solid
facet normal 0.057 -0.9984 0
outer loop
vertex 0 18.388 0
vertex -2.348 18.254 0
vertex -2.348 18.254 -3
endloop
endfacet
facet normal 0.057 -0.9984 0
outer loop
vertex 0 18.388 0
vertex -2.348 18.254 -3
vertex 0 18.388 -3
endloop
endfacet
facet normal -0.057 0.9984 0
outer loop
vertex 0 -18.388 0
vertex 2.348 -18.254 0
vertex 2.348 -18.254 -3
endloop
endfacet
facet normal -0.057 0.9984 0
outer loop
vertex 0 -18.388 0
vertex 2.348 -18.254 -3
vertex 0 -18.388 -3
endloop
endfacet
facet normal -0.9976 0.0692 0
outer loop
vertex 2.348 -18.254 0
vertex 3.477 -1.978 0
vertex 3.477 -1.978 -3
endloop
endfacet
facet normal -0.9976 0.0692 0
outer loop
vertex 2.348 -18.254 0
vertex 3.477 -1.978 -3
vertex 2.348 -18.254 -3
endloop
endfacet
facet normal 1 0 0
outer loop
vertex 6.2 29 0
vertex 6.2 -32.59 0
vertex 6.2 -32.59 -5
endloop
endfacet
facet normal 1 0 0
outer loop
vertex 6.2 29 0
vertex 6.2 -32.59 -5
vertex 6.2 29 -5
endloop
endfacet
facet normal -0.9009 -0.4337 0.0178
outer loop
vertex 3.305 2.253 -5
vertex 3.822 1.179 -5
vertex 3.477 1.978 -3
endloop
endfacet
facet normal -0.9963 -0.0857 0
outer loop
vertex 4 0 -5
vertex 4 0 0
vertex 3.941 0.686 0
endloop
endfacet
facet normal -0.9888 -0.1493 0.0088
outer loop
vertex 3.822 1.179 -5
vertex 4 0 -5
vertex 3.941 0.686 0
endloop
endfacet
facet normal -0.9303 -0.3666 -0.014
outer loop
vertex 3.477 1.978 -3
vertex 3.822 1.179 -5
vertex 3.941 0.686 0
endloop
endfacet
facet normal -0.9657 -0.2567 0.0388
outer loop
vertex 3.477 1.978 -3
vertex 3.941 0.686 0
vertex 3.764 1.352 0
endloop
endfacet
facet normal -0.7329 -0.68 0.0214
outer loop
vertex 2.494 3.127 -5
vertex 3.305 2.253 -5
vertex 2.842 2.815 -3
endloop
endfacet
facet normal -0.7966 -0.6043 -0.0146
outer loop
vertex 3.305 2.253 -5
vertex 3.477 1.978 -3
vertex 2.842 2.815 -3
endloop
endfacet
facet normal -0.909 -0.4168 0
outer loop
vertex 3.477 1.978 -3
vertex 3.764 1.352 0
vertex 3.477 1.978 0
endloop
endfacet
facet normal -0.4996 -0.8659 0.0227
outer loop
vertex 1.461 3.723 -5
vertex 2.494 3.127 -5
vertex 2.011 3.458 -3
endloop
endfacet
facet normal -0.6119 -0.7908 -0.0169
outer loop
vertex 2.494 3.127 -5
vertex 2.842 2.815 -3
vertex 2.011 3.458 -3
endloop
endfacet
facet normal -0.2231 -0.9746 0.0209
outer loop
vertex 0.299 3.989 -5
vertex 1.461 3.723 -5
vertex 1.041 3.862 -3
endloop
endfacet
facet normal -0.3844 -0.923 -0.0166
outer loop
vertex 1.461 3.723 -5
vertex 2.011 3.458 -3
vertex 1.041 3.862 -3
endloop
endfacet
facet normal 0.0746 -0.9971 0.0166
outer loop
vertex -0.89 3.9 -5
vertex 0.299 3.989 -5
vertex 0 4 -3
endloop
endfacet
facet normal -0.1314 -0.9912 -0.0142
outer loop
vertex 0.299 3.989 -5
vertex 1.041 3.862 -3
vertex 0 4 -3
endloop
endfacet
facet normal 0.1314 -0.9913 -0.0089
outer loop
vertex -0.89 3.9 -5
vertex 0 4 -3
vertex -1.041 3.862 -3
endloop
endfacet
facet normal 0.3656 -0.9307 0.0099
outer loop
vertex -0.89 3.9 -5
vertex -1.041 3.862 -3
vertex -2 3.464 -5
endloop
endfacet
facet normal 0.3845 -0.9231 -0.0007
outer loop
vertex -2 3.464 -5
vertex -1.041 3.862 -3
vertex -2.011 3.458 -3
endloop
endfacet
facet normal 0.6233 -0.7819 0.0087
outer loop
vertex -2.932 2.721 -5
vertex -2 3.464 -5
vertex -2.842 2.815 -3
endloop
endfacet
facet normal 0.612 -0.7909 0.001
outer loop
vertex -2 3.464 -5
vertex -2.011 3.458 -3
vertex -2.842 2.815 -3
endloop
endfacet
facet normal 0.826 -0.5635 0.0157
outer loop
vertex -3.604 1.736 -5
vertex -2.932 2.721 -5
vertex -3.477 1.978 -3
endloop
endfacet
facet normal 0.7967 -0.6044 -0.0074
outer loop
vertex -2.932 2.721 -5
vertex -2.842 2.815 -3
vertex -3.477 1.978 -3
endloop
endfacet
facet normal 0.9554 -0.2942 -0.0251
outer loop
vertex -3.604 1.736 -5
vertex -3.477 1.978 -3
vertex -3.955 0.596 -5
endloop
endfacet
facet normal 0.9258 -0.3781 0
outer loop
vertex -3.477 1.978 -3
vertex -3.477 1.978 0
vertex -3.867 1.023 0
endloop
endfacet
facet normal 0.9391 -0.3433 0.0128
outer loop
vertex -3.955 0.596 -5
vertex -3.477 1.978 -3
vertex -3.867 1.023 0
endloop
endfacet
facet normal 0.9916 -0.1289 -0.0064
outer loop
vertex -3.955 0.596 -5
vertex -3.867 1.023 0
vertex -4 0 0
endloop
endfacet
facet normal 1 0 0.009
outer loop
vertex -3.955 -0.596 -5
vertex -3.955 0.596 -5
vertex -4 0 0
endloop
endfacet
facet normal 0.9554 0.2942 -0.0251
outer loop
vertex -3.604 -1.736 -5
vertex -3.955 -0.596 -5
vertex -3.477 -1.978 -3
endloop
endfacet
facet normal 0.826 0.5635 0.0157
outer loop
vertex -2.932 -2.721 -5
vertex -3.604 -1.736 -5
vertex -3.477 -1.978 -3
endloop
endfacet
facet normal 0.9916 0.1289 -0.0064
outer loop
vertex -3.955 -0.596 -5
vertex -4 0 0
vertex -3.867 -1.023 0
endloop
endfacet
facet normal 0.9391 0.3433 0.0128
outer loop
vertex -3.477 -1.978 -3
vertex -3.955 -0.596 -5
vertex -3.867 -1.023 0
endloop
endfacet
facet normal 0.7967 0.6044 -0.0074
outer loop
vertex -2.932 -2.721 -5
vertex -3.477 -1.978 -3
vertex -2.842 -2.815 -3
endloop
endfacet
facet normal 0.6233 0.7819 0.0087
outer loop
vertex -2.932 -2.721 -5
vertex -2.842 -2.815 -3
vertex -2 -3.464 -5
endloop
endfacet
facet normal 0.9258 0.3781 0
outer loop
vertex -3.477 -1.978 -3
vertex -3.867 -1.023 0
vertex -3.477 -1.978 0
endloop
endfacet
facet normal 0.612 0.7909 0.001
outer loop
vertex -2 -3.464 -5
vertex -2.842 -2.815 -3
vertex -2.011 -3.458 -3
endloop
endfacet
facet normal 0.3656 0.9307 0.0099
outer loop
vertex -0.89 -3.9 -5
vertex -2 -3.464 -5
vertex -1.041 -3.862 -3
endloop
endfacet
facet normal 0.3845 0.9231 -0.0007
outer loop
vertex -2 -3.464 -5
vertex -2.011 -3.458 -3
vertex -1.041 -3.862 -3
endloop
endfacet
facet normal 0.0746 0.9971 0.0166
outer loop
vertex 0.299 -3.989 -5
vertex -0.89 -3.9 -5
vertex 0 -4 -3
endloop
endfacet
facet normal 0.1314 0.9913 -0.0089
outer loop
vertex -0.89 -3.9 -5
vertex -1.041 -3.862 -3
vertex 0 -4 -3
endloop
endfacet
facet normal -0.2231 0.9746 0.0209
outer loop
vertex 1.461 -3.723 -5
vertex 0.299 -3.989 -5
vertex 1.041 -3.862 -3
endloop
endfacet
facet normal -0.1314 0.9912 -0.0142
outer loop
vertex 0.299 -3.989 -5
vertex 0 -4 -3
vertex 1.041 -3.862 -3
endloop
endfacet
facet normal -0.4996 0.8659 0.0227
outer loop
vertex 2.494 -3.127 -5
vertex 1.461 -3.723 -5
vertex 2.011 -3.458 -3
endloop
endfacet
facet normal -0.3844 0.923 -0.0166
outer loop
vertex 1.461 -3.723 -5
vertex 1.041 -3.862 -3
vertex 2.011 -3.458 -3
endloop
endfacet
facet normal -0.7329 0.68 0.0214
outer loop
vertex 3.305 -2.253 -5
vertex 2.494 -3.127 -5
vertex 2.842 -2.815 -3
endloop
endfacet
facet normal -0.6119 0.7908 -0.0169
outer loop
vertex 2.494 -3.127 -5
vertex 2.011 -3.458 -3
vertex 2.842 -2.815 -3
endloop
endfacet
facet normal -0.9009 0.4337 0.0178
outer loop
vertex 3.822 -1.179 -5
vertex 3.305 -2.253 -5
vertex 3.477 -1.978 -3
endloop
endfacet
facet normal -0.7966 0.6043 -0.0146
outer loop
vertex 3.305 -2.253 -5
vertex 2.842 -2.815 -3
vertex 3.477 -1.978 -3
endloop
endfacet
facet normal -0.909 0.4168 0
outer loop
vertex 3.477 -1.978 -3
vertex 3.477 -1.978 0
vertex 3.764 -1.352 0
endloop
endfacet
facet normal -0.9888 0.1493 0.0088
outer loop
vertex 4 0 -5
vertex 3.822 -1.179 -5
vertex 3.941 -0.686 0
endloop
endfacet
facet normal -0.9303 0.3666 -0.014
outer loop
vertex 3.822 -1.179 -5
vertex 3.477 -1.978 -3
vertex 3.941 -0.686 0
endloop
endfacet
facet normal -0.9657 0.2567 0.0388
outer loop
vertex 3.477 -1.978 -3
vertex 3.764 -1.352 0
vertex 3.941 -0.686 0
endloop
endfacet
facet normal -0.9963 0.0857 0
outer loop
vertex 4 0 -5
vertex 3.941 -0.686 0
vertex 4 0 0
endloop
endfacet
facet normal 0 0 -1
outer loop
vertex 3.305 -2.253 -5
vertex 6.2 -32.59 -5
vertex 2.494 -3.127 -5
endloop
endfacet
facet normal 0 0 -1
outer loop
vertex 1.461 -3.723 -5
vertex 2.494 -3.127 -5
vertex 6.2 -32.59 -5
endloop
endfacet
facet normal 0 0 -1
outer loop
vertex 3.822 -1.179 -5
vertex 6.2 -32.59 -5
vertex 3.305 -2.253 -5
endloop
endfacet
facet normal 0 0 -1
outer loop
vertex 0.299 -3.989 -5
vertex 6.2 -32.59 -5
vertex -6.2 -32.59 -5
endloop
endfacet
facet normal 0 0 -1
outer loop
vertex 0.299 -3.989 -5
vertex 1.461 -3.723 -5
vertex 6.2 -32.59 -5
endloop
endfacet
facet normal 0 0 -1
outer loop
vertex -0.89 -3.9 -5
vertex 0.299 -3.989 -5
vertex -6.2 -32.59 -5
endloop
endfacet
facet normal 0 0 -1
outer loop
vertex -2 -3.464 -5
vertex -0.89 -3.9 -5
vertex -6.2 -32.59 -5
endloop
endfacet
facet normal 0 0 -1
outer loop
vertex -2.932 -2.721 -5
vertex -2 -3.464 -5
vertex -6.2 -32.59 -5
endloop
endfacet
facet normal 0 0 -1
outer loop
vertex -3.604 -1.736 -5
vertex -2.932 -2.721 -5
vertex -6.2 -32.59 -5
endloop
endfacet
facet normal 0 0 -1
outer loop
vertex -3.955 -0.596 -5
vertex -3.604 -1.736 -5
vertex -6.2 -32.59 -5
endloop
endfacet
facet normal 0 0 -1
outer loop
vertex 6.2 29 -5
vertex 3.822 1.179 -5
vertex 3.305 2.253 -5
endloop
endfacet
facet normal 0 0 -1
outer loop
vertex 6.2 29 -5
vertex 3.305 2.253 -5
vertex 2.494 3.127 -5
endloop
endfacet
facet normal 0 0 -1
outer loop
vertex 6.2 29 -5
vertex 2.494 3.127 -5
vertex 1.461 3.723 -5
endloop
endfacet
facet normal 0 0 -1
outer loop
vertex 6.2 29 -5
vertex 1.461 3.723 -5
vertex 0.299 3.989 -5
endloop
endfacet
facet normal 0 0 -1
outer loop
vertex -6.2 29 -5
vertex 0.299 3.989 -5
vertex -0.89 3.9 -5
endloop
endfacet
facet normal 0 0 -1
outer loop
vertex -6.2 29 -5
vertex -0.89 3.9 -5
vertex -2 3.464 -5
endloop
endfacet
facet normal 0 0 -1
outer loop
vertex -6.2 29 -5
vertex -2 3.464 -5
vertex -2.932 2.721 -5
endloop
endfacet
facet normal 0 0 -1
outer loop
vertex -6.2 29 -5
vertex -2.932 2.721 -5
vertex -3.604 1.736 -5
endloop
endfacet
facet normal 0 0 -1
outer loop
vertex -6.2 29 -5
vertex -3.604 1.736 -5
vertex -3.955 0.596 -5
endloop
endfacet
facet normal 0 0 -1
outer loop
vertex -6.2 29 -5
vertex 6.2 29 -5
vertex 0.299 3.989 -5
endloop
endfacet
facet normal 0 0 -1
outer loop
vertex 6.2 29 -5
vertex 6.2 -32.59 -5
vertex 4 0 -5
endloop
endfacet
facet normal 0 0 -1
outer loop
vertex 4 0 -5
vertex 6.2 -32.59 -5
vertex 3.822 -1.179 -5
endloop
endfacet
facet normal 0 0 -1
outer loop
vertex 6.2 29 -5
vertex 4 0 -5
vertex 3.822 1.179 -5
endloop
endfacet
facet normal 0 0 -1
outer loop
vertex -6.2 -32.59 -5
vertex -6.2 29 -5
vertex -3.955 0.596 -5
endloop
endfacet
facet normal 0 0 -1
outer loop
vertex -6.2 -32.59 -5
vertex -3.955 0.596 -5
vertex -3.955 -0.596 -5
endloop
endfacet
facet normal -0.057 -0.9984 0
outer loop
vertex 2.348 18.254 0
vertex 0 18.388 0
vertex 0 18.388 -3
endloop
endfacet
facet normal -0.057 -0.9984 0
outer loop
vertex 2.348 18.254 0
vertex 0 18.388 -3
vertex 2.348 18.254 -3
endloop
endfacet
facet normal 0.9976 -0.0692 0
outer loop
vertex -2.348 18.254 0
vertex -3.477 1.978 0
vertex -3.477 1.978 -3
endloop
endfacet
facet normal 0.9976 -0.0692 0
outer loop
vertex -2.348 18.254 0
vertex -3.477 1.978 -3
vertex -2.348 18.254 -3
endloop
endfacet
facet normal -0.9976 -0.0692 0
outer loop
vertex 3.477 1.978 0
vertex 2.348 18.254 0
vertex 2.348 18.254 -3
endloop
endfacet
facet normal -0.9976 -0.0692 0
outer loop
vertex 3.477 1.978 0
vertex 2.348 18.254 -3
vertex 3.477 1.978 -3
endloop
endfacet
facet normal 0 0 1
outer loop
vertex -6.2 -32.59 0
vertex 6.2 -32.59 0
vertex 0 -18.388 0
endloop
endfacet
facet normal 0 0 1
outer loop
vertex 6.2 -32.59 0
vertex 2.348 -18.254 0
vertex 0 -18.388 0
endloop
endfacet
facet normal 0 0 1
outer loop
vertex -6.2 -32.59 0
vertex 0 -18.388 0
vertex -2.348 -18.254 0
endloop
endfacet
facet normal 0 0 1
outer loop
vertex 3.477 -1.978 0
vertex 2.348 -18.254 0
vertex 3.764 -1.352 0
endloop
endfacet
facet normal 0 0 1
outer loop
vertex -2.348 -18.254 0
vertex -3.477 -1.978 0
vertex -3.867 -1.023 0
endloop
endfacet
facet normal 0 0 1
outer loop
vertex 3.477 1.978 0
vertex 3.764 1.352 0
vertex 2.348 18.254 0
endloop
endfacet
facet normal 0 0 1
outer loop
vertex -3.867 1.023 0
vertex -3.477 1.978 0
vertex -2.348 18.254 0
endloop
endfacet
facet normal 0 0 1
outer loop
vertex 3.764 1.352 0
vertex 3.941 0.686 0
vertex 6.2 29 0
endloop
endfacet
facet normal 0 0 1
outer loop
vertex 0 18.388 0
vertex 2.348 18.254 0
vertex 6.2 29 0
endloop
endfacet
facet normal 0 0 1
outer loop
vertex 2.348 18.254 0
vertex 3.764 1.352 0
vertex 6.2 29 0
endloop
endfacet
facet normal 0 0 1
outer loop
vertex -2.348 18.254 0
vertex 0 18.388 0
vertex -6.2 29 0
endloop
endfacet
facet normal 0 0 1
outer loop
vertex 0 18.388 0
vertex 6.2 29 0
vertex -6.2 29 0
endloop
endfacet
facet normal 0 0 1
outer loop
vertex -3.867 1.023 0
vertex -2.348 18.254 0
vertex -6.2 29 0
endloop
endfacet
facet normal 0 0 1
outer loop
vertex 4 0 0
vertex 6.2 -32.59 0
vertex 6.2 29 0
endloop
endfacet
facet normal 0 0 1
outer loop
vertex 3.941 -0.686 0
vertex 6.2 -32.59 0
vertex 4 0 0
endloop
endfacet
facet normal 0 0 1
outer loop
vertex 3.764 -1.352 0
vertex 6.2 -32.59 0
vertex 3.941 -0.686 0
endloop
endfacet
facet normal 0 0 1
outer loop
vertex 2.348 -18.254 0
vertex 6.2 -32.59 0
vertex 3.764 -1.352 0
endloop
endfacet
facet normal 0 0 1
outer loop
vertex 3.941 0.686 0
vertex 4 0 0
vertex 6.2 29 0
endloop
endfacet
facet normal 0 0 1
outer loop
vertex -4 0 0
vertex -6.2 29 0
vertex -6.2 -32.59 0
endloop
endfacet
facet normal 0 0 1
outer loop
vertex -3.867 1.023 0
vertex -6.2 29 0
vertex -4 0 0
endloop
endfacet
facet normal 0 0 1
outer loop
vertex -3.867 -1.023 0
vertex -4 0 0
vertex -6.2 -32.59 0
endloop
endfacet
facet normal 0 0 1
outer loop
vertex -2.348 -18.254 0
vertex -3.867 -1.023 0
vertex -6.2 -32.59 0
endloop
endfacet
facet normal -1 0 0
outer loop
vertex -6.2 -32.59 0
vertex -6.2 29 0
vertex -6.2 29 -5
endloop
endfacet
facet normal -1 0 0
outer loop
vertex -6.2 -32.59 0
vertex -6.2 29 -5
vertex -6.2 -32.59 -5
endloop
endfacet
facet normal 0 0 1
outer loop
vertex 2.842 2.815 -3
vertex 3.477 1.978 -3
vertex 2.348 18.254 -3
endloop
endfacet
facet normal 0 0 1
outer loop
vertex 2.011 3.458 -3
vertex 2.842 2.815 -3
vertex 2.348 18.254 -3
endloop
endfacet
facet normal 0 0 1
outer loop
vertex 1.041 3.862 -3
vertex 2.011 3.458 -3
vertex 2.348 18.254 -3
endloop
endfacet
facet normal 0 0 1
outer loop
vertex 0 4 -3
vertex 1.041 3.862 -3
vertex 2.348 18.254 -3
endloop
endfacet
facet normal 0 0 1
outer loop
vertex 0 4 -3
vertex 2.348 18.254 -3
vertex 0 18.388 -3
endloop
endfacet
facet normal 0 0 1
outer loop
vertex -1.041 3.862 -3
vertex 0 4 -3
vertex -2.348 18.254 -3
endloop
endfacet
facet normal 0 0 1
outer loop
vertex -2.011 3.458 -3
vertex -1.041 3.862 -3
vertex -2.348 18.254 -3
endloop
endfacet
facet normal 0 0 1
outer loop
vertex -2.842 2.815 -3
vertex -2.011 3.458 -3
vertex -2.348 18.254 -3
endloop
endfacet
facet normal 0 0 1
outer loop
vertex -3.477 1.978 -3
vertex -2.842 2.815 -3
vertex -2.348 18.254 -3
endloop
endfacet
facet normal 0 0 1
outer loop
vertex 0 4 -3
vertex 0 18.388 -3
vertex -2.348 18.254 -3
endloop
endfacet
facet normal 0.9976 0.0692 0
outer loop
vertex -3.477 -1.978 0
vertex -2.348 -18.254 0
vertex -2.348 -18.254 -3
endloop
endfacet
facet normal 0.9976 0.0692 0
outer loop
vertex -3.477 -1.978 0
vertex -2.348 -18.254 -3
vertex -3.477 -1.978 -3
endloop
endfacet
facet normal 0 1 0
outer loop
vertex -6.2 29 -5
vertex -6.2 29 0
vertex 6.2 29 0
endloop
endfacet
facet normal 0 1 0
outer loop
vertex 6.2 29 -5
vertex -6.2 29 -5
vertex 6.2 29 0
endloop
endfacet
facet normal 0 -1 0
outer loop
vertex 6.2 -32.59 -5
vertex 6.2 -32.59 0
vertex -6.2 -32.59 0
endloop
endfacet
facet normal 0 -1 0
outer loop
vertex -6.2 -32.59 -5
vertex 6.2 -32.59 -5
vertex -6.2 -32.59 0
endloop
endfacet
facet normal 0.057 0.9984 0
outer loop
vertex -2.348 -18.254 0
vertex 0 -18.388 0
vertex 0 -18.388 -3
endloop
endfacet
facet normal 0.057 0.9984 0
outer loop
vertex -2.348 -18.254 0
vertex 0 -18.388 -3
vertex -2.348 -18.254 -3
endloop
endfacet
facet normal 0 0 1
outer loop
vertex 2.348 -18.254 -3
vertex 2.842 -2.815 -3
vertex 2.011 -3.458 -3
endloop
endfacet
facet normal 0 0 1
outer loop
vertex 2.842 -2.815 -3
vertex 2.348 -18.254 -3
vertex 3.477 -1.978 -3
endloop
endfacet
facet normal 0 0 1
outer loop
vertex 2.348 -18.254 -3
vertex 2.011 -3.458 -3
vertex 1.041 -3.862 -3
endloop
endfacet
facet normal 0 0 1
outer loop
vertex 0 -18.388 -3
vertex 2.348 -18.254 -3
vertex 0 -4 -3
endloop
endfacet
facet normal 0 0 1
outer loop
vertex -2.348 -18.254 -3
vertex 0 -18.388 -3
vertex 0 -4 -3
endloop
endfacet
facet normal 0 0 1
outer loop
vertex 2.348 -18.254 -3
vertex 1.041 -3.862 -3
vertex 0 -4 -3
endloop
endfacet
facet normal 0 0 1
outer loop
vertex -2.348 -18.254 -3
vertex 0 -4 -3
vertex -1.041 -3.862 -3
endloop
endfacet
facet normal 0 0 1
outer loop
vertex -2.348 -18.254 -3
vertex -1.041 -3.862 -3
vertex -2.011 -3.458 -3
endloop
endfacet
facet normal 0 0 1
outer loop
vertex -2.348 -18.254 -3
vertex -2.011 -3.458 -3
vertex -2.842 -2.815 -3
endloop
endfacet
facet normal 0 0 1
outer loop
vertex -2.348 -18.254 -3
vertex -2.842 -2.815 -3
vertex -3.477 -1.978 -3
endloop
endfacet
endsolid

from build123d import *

# Parameters (mm, degrees)
BOSS_EXTRUDE1_DEPTH = 5
CUT_EXTRUDE1_DEPTH  = 3
SKETCH4_R           = 4
CUT_EXTRUDE2_DEPTH  = 5


with BuildPart() as part:
    # Sketch1 → Boss-Extrude1 (new body)
    with BuildSketch(Plane.XY):
        Polygon((6.2, -29), (6.2, -32.59), (-6.2, -32.59), (-6.2, -29), (-6.2, 29), (6.2, 29), align=None)
    extrude(amount=-BOSS_EXTRUDE1_DEPTH)

    # Sketch2 → Cut-Extrude1 (cut)
    with BuildSketch(Plane.XY):
        Polygon((-3.613807992, 0), (-2.3482015, 18.253803872), (0, 18.387804485), (2.3482015, 18.253803872), (3.613807992, 0), (2.3482015, -18.253803872), (0, -18.387804485), (-2.3482015, -18.253803872), align=None)
    extrude(amount=-CUT_EXTRUDE1_DEPTH, mode=Mode.SUBTRACT)

    # Sketch4 → Cut-Extrude2 (cut)
    with BuildSketch(Plane.XY):
        Circle(SKETCH4_R)
    extrude(amount=-CUT_EXTRUDE2_DEPTH, mode=Mode.SUBTRACT)


solid = part.part
